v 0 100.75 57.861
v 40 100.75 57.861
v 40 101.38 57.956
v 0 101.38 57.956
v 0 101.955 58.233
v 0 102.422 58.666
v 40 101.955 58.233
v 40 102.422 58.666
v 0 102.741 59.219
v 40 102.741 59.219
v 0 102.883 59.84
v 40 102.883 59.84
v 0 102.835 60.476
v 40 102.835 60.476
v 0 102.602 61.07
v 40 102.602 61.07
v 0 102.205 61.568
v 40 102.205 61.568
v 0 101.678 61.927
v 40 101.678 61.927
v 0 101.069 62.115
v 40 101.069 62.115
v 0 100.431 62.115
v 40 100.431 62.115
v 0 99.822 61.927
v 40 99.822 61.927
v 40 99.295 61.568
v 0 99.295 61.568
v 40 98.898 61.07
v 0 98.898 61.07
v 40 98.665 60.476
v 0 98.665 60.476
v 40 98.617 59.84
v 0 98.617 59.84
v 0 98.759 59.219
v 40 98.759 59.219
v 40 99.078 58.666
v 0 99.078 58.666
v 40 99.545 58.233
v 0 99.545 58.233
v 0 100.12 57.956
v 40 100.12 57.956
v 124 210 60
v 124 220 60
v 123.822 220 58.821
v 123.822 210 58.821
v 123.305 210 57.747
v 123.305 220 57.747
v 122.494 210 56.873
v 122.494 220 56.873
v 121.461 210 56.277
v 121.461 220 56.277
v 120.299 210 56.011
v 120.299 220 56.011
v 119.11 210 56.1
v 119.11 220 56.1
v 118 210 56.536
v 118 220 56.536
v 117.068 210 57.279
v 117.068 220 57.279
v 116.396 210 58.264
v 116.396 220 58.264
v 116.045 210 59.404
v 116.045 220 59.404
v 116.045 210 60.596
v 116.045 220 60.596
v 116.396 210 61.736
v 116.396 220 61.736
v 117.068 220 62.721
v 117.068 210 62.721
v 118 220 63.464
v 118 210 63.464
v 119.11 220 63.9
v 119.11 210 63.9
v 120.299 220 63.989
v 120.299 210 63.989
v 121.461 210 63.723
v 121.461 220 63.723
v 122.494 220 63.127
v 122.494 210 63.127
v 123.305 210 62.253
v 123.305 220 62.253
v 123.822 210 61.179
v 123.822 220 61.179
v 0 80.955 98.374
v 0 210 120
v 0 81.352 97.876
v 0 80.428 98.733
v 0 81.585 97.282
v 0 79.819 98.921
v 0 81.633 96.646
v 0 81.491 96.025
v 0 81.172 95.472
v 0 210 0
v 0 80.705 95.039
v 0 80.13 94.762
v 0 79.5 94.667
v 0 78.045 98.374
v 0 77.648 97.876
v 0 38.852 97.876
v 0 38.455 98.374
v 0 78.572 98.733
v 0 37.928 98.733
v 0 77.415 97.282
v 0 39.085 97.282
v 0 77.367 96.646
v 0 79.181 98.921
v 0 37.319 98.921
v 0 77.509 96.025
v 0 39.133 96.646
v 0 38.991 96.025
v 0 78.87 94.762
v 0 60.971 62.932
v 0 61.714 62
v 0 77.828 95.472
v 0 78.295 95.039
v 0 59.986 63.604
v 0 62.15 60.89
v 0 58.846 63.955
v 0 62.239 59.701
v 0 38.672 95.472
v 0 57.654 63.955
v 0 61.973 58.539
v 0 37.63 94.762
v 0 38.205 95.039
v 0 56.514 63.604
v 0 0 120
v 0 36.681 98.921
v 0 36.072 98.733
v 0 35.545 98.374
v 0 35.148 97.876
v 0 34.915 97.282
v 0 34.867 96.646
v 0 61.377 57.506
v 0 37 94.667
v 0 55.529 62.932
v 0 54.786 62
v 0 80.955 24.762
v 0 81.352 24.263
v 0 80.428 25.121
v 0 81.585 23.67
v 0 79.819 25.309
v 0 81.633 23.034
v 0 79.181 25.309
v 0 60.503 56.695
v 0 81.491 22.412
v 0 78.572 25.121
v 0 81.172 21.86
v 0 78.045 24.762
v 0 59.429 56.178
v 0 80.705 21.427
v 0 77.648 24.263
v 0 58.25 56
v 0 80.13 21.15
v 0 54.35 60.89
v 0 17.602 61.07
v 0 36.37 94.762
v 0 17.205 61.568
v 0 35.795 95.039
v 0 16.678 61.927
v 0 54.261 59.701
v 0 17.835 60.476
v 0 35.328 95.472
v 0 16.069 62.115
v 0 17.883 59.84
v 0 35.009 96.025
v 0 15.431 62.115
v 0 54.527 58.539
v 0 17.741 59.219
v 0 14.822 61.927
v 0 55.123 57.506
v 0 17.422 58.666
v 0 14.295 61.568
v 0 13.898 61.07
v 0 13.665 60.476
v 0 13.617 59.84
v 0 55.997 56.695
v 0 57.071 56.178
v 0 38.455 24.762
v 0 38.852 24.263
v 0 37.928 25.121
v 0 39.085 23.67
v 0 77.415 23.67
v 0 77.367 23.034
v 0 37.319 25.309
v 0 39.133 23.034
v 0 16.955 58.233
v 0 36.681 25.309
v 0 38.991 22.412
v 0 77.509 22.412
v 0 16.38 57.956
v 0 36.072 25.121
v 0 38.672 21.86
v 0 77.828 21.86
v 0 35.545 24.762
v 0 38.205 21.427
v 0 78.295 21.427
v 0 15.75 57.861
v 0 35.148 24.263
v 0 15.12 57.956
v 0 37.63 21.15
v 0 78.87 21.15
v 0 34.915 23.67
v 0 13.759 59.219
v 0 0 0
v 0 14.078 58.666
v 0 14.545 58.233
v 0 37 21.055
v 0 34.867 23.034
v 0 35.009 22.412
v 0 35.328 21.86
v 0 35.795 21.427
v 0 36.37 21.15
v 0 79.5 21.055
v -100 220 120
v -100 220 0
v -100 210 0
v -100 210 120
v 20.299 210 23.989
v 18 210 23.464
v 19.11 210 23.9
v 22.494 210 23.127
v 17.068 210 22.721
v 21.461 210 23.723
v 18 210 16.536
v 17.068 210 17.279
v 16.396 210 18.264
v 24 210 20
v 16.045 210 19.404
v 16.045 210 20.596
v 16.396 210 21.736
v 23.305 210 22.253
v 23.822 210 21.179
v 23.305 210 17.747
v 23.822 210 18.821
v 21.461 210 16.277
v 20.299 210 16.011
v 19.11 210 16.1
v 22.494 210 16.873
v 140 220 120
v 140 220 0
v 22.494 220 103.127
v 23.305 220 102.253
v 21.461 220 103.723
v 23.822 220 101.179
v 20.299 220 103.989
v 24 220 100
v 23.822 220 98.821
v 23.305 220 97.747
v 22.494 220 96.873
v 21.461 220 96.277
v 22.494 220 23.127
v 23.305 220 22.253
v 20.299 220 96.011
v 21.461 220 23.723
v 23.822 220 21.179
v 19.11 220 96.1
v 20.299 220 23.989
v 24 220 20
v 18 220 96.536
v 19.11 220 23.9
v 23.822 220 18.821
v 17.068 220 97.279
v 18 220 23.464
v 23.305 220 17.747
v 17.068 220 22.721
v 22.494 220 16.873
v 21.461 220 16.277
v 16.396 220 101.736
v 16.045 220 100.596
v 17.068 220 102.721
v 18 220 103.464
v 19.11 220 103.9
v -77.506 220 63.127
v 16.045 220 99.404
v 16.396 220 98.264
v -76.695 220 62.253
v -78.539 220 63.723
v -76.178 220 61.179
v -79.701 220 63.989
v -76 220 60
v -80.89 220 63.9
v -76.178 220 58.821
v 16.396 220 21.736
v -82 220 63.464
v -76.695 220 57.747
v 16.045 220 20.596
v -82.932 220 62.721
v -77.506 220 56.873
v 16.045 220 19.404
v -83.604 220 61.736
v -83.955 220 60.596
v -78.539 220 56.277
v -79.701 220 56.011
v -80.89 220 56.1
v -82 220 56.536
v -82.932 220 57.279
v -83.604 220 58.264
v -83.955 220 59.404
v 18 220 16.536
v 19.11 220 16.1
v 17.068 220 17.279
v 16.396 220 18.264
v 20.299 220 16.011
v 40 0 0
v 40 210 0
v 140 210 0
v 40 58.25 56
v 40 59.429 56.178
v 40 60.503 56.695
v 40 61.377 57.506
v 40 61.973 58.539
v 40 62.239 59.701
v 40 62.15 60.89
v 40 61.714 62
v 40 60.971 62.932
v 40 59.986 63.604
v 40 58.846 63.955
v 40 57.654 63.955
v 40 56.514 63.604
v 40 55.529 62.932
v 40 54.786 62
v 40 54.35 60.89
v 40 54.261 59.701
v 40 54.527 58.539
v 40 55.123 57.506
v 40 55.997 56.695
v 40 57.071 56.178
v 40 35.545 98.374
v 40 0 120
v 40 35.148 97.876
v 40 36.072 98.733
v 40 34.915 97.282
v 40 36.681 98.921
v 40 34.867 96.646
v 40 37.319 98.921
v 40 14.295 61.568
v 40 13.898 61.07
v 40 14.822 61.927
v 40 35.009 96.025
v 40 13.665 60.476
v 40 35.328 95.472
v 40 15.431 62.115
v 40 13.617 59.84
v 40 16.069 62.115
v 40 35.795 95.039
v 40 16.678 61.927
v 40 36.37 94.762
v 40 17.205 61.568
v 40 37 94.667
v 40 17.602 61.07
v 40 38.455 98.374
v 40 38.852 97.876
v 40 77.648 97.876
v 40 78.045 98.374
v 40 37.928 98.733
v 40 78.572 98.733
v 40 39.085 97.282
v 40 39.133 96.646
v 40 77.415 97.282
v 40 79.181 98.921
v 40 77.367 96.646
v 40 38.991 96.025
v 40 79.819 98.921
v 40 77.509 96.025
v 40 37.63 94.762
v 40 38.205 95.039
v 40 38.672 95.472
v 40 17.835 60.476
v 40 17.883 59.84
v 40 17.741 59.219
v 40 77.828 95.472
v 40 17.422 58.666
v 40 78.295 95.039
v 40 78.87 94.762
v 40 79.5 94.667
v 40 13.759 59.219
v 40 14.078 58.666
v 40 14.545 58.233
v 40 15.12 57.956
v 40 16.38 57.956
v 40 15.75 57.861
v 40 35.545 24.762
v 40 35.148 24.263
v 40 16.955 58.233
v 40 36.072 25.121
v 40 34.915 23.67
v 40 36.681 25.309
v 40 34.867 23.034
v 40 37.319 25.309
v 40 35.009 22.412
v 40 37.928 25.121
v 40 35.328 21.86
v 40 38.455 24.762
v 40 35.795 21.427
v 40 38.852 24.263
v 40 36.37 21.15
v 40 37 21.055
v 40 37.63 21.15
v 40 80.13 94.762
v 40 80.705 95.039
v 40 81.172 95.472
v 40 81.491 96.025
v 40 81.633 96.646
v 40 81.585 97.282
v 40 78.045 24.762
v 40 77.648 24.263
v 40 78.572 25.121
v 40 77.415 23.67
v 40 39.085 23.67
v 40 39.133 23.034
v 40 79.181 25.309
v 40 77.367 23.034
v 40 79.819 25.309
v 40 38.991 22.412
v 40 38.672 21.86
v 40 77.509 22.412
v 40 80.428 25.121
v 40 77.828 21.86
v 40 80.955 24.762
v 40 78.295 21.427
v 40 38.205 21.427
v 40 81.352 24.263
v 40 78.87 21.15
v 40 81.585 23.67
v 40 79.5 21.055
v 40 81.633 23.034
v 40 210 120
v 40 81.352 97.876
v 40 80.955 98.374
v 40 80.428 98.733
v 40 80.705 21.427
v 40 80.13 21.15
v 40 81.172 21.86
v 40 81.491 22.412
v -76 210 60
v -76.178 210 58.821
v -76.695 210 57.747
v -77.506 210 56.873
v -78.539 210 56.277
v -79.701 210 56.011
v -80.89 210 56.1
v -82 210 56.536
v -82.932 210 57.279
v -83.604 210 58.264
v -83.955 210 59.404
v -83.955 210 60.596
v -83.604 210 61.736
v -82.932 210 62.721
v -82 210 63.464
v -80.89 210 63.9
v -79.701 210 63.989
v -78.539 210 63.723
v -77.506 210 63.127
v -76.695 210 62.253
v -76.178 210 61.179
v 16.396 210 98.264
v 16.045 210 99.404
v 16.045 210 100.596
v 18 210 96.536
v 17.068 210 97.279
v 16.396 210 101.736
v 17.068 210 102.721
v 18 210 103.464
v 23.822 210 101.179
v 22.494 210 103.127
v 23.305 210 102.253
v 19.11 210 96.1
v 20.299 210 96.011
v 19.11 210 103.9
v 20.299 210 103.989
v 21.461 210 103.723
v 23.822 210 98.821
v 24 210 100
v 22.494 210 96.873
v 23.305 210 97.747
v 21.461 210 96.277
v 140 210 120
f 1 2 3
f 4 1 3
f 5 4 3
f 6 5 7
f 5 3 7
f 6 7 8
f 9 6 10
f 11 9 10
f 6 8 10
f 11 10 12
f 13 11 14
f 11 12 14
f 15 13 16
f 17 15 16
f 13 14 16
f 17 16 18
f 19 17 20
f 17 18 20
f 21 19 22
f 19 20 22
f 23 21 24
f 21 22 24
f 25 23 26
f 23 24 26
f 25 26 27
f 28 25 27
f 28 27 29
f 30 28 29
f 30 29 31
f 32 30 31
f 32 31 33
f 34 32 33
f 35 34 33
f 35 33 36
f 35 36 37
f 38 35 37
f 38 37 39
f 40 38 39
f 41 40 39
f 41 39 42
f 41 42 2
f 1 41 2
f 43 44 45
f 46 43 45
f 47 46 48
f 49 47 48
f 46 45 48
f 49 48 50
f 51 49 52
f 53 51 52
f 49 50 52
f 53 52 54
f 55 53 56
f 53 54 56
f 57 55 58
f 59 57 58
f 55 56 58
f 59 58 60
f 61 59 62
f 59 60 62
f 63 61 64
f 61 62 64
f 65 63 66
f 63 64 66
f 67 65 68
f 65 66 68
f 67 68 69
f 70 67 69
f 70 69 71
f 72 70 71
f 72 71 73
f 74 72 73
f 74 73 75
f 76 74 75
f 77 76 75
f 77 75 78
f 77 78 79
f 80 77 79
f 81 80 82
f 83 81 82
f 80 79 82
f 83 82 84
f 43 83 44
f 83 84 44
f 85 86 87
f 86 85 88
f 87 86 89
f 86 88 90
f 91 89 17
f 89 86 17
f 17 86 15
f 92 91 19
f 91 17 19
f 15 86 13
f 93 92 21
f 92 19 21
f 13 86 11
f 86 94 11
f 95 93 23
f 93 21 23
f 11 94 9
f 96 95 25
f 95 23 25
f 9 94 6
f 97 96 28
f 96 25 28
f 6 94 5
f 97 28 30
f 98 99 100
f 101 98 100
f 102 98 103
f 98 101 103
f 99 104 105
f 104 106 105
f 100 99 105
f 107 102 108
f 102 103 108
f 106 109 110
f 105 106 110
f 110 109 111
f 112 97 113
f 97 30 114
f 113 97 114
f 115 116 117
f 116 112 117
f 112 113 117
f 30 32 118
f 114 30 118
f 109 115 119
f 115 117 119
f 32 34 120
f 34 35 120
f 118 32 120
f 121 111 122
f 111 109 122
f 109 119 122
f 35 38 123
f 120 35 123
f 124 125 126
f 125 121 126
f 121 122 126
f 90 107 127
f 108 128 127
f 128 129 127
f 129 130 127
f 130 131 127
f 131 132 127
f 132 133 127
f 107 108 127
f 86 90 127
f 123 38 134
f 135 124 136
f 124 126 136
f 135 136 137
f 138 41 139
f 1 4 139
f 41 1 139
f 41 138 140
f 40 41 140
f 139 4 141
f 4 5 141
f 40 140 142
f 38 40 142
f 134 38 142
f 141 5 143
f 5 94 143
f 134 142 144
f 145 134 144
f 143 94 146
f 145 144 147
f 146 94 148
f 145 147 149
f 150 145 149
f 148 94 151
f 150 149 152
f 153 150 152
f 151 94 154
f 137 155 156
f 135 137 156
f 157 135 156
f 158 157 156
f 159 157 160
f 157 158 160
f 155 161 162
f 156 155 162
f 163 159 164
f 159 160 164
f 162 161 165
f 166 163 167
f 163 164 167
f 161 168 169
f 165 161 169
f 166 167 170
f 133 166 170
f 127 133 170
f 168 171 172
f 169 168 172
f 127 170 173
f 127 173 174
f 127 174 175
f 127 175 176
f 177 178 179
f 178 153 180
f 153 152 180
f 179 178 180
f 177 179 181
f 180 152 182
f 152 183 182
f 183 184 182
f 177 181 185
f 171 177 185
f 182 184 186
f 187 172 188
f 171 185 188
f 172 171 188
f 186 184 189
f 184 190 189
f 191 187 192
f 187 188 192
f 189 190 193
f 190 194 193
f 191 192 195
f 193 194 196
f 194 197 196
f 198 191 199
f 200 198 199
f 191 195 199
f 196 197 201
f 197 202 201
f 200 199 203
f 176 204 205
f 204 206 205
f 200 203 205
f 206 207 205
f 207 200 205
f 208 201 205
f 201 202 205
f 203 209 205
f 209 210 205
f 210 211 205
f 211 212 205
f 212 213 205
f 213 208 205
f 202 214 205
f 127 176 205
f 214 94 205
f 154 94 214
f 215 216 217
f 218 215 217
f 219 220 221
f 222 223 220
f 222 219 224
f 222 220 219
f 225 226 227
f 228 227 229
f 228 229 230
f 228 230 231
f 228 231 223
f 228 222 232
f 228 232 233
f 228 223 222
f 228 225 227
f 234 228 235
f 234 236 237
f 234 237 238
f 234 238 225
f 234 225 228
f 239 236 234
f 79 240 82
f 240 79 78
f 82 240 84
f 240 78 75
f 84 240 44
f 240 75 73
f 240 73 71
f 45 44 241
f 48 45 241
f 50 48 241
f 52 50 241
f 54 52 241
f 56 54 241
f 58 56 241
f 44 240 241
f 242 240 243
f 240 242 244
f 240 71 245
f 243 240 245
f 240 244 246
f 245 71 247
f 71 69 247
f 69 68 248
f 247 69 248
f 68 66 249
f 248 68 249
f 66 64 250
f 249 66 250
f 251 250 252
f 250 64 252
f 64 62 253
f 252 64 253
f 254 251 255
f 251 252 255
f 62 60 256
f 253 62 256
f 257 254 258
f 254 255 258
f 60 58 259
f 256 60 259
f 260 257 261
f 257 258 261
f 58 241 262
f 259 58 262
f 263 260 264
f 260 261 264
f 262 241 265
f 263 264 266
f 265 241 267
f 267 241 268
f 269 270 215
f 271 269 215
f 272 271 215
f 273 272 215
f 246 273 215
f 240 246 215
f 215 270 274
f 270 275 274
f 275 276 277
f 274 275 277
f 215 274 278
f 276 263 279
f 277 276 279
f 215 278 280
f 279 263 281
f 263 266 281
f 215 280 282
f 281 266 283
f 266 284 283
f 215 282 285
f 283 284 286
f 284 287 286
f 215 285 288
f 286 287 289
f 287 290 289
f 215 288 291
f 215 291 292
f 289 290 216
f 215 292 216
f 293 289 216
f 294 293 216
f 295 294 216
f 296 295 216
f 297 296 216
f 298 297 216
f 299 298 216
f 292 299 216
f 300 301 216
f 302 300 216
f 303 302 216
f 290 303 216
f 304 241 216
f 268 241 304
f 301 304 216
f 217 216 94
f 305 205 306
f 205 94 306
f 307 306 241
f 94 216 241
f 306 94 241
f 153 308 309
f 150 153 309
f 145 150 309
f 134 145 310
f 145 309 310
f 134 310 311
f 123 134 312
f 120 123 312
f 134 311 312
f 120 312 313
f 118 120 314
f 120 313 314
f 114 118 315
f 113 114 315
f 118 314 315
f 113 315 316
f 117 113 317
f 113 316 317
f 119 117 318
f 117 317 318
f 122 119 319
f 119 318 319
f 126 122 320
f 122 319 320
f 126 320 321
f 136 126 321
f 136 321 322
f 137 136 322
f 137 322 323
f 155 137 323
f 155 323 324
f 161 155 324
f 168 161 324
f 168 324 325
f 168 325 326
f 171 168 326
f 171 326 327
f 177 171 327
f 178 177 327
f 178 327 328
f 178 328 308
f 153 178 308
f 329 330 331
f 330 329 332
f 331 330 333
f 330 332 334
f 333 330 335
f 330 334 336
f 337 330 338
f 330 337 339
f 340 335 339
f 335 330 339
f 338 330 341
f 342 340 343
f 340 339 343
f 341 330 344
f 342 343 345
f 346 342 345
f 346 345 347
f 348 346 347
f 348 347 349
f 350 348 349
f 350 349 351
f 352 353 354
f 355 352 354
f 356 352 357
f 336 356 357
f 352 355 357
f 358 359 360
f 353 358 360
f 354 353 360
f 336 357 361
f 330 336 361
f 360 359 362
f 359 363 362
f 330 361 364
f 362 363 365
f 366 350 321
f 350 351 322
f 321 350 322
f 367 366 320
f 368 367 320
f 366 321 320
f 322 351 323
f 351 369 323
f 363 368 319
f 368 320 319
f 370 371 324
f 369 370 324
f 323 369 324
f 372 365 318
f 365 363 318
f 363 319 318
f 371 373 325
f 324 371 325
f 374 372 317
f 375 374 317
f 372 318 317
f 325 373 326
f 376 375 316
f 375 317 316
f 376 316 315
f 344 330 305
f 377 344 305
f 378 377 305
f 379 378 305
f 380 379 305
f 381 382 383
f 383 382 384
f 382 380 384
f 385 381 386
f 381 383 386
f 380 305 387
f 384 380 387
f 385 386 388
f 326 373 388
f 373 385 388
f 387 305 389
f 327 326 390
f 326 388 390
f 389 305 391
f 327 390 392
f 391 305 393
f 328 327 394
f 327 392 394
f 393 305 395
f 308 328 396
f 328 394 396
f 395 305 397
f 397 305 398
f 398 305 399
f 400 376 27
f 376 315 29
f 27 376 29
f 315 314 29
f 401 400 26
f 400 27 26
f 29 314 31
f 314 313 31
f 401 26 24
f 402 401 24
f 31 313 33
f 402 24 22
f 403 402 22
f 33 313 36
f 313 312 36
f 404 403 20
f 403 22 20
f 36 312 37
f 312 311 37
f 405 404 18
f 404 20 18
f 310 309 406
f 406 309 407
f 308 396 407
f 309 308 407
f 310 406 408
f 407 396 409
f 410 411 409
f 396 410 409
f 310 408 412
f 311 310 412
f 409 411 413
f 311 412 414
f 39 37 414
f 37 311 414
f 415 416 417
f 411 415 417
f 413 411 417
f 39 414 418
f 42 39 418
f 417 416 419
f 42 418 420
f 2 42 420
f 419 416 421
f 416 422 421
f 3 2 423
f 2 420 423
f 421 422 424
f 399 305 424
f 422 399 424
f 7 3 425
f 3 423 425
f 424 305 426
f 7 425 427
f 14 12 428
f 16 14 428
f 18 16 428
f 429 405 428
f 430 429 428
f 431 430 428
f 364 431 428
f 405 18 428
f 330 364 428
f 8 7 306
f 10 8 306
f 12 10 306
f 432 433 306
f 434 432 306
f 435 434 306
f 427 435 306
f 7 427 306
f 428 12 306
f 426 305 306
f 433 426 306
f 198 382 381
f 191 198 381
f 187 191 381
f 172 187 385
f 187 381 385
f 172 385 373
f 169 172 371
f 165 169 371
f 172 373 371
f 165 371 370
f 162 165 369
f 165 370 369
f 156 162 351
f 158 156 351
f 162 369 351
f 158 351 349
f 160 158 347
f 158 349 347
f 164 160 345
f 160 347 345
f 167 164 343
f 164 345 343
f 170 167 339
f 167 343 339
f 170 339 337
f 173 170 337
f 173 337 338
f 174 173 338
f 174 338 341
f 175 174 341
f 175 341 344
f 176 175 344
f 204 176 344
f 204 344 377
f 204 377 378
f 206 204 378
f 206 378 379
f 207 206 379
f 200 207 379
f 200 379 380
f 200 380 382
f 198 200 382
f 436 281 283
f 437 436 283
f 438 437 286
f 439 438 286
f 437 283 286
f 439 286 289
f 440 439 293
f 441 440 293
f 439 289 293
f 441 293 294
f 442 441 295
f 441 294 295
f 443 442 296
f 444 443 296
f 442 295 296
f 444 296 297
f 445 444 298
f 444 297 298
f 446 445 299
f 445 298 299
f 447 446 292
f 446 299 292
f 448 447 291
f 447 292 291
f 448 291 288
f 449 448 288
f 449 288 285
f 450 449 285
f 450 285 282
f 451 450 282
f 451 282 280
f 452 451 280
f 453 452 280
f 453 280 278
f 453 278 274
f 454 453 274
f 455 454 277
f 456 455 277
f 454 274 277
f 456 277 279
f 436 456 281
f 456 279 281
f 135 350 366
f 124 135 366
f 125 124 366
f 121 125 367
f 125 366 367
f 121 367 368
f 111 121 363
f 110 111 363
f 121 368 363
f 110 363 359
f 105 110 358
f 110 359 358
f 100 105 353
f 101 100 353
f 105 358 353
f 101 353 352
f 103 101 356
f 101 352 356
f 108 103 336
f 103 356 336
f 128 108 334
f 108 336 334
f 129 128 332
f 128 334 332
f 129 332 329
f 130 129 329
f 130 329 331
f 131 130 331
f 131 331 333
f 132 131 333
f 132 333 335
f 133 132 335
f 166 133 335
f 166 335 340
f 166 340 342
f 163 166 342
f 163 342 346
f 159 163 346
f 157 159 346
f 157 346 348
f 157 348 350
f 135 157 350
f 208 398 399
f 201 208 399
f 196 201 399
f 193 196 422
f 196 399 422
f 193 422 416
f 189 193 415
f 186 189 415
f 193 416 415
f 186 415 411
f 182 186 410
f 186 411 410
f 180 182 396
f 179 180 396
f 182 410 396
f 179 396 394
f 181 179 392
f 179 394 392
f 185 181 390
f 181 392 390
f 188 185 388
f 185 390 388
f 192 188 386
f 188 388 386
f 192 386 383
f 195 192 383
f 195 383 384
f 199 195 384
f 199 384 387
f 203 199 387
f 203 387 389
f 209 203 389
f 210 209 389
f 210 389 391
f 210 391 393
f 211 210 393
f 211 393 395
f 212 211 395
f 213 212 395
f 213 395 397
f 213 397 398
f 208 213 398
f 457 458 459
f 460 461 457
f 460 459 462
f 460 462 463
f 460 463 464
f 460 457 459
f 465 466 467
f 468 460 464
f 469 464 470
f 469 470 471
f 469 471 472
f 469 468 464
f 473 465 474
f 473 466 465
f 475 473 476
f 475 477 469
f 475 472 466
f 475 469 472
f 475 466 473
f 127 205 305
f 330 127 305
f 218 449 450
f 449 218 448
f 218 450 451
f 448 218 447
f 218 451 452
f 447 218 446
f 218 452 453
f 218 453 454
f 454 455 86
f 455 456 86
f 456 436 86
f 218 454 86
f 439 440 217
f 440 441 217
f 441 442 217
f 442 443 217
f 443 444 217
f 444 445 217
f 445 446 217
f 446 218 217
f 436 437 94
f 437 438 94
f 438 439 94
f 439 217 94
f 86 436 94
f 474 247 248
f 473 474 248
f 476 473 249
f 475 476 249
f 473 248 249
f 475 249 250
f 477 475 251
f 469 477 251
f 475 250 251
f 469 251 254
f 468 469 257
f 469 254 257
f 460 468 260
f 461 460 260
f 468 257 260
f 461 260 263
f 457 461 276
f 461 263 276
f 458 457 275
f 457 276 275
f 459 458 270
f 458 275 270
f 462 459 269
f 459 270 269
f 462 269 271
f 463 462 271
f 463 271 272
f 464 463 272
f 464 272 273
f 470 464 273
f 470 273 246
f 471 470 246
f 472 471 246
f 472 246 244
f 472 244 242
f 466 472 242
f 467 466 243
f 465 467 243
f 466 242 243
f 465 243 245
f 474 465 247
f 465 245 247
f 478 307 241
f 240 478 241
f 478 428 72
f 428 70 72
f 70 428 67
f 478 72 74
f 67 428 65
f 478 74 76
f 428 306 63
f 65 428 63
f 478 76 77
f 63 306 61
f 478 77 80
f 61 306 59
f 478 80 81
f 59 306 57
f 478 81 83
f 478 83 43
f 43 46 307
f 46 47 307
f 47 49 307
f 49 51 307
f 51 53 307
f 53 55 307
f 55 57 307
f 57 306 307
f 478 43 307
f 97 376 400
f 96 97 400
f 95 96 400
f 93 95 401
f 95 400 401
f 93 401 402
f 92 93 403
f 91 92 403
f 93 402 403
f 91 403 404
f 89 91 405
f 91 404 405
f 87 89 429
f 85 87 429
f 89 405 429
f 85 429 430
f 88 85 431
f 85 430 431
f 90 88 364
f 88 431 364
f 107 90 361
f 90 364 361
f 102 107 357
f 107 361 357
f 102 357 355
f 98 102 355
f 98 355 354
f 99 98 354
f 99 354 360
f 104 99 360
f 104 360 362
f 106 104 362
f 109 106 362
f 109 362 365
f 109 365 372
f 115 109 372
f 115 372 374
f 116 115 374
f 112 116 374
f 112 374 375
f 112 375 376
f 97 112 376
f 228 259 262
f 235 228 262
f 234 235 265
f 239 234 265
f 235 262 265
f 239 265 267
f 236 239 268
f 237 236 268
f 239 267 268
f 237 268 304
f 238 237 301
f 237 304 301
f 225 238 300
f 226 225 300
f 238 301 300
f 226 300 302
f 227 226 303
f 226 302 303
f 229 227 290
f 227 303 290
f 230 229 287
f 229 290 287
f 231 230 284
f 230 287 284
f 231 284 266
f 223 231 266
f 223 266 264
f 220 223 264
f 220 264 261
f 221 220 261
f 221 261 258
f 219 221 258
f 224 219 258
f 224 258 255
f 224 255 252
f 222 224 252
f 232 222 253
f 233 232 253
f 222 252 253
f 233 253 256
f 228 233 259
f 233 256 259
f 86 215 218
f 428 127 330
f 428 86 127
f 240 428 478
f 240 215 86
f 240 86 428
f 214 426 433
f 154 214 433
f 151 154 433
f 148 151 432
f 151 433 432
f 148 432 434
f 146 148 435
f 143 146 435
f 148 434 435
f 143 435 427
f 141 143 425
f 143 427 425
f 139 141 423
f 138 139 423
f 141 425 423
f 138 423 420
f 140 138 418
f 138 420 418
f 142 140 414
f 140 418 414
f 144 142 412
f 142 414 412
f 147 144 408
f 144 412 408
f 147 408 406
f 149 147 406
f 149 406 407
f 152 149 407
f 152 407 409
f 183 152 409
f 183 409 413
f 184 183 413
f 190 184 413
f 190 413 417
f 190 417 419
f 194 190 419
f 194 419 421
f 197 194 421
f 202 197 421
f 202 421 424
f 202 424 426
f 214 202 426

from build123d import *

# Parameters (mm, degrees)
EXTRUDE_1_DEPTH          = 120
SKETCH_2_R               = 4
SKETCH_2_R_2             = 2.139034835
CUT_EXTRUDE_1_DEPTH      = 100
SKETCH_3_R               = 4
CUT_EXTRUDE_2_DEPTH      = 1
CUT_EXTRUDE_2_DEPTH_BACK = 10


with BuildPart() as part:
    # 草图1 → 凸台-拉伸1 (new body)
    with BuildSketch(Plane.XY):
        Polygon((0, 0), (40, 0), (40, 210), (140, 210), (140, 220), (-100, 220), (-100, 210), (0, 210), align=None)
    extrude(amount=EXTRUDE_1_DEPTH)

    # 草图2 → 切除-拉伸1 (cut)
    with BuildSketch(Plane(origin=(40, 0, 0), x_dir=(0, 0, -1), z_dir=(1, 0, 0))):
        with Locations((-60, 58.25)):
            Circle(SKETCH_2_R)
        with Locations((-60, 100.75)):
            Circle(SKETCH_2_R_2)
        with Locations((-23.193920339, 79.5)):
            Circle(SKETCH_2_R_2)
        with Locations((-23.193920339, 37)):
            Circle(SKETCH_2_R_2)
        with Locations((-60, 15.75)):
            Circle(SKETCH_2_R_2)
        with Locations((-96.806079661, 37)):
            Circle(SKETCH_2_R_2)
        with Locations((-96.806079661, 79.5)):
            Circle(SKETCH_2_R_2)
    extrude(amount=-CUT_EXTRUDE_1_DEPTH, mode=Mode.SUBTRACT)

    # 草图3 → 切除-拉伸2 (cut, two sides)
    with BuildSketch(Plane(origin=(0, 220, 0), x_dir=(1, 0, 0), z_dir=(0, 1, 0))) as cut_extrude_2_sk:
        with Locations((-80, -60)):
            Circle(SKETCH_3_R)
        with Locations((20, -20)):
            Circle(SKETCH_3_R)
        with Locations((120, -60)):
            Circle(SKETCH_3_R)
        with Locations((20, -100)):
            Circle(SKETCH_3_R)
    extrude(amount=CUT_EXTRUDE_2_DEPTH, mode=Mode.SUBTRACT)
    extrude(cut_extrude_2_sk.sketch, amount=-CUT_EXTRUDE_2_DEPTH_BACK, mode=Mode.SUBTRACT)


solid = part.part
